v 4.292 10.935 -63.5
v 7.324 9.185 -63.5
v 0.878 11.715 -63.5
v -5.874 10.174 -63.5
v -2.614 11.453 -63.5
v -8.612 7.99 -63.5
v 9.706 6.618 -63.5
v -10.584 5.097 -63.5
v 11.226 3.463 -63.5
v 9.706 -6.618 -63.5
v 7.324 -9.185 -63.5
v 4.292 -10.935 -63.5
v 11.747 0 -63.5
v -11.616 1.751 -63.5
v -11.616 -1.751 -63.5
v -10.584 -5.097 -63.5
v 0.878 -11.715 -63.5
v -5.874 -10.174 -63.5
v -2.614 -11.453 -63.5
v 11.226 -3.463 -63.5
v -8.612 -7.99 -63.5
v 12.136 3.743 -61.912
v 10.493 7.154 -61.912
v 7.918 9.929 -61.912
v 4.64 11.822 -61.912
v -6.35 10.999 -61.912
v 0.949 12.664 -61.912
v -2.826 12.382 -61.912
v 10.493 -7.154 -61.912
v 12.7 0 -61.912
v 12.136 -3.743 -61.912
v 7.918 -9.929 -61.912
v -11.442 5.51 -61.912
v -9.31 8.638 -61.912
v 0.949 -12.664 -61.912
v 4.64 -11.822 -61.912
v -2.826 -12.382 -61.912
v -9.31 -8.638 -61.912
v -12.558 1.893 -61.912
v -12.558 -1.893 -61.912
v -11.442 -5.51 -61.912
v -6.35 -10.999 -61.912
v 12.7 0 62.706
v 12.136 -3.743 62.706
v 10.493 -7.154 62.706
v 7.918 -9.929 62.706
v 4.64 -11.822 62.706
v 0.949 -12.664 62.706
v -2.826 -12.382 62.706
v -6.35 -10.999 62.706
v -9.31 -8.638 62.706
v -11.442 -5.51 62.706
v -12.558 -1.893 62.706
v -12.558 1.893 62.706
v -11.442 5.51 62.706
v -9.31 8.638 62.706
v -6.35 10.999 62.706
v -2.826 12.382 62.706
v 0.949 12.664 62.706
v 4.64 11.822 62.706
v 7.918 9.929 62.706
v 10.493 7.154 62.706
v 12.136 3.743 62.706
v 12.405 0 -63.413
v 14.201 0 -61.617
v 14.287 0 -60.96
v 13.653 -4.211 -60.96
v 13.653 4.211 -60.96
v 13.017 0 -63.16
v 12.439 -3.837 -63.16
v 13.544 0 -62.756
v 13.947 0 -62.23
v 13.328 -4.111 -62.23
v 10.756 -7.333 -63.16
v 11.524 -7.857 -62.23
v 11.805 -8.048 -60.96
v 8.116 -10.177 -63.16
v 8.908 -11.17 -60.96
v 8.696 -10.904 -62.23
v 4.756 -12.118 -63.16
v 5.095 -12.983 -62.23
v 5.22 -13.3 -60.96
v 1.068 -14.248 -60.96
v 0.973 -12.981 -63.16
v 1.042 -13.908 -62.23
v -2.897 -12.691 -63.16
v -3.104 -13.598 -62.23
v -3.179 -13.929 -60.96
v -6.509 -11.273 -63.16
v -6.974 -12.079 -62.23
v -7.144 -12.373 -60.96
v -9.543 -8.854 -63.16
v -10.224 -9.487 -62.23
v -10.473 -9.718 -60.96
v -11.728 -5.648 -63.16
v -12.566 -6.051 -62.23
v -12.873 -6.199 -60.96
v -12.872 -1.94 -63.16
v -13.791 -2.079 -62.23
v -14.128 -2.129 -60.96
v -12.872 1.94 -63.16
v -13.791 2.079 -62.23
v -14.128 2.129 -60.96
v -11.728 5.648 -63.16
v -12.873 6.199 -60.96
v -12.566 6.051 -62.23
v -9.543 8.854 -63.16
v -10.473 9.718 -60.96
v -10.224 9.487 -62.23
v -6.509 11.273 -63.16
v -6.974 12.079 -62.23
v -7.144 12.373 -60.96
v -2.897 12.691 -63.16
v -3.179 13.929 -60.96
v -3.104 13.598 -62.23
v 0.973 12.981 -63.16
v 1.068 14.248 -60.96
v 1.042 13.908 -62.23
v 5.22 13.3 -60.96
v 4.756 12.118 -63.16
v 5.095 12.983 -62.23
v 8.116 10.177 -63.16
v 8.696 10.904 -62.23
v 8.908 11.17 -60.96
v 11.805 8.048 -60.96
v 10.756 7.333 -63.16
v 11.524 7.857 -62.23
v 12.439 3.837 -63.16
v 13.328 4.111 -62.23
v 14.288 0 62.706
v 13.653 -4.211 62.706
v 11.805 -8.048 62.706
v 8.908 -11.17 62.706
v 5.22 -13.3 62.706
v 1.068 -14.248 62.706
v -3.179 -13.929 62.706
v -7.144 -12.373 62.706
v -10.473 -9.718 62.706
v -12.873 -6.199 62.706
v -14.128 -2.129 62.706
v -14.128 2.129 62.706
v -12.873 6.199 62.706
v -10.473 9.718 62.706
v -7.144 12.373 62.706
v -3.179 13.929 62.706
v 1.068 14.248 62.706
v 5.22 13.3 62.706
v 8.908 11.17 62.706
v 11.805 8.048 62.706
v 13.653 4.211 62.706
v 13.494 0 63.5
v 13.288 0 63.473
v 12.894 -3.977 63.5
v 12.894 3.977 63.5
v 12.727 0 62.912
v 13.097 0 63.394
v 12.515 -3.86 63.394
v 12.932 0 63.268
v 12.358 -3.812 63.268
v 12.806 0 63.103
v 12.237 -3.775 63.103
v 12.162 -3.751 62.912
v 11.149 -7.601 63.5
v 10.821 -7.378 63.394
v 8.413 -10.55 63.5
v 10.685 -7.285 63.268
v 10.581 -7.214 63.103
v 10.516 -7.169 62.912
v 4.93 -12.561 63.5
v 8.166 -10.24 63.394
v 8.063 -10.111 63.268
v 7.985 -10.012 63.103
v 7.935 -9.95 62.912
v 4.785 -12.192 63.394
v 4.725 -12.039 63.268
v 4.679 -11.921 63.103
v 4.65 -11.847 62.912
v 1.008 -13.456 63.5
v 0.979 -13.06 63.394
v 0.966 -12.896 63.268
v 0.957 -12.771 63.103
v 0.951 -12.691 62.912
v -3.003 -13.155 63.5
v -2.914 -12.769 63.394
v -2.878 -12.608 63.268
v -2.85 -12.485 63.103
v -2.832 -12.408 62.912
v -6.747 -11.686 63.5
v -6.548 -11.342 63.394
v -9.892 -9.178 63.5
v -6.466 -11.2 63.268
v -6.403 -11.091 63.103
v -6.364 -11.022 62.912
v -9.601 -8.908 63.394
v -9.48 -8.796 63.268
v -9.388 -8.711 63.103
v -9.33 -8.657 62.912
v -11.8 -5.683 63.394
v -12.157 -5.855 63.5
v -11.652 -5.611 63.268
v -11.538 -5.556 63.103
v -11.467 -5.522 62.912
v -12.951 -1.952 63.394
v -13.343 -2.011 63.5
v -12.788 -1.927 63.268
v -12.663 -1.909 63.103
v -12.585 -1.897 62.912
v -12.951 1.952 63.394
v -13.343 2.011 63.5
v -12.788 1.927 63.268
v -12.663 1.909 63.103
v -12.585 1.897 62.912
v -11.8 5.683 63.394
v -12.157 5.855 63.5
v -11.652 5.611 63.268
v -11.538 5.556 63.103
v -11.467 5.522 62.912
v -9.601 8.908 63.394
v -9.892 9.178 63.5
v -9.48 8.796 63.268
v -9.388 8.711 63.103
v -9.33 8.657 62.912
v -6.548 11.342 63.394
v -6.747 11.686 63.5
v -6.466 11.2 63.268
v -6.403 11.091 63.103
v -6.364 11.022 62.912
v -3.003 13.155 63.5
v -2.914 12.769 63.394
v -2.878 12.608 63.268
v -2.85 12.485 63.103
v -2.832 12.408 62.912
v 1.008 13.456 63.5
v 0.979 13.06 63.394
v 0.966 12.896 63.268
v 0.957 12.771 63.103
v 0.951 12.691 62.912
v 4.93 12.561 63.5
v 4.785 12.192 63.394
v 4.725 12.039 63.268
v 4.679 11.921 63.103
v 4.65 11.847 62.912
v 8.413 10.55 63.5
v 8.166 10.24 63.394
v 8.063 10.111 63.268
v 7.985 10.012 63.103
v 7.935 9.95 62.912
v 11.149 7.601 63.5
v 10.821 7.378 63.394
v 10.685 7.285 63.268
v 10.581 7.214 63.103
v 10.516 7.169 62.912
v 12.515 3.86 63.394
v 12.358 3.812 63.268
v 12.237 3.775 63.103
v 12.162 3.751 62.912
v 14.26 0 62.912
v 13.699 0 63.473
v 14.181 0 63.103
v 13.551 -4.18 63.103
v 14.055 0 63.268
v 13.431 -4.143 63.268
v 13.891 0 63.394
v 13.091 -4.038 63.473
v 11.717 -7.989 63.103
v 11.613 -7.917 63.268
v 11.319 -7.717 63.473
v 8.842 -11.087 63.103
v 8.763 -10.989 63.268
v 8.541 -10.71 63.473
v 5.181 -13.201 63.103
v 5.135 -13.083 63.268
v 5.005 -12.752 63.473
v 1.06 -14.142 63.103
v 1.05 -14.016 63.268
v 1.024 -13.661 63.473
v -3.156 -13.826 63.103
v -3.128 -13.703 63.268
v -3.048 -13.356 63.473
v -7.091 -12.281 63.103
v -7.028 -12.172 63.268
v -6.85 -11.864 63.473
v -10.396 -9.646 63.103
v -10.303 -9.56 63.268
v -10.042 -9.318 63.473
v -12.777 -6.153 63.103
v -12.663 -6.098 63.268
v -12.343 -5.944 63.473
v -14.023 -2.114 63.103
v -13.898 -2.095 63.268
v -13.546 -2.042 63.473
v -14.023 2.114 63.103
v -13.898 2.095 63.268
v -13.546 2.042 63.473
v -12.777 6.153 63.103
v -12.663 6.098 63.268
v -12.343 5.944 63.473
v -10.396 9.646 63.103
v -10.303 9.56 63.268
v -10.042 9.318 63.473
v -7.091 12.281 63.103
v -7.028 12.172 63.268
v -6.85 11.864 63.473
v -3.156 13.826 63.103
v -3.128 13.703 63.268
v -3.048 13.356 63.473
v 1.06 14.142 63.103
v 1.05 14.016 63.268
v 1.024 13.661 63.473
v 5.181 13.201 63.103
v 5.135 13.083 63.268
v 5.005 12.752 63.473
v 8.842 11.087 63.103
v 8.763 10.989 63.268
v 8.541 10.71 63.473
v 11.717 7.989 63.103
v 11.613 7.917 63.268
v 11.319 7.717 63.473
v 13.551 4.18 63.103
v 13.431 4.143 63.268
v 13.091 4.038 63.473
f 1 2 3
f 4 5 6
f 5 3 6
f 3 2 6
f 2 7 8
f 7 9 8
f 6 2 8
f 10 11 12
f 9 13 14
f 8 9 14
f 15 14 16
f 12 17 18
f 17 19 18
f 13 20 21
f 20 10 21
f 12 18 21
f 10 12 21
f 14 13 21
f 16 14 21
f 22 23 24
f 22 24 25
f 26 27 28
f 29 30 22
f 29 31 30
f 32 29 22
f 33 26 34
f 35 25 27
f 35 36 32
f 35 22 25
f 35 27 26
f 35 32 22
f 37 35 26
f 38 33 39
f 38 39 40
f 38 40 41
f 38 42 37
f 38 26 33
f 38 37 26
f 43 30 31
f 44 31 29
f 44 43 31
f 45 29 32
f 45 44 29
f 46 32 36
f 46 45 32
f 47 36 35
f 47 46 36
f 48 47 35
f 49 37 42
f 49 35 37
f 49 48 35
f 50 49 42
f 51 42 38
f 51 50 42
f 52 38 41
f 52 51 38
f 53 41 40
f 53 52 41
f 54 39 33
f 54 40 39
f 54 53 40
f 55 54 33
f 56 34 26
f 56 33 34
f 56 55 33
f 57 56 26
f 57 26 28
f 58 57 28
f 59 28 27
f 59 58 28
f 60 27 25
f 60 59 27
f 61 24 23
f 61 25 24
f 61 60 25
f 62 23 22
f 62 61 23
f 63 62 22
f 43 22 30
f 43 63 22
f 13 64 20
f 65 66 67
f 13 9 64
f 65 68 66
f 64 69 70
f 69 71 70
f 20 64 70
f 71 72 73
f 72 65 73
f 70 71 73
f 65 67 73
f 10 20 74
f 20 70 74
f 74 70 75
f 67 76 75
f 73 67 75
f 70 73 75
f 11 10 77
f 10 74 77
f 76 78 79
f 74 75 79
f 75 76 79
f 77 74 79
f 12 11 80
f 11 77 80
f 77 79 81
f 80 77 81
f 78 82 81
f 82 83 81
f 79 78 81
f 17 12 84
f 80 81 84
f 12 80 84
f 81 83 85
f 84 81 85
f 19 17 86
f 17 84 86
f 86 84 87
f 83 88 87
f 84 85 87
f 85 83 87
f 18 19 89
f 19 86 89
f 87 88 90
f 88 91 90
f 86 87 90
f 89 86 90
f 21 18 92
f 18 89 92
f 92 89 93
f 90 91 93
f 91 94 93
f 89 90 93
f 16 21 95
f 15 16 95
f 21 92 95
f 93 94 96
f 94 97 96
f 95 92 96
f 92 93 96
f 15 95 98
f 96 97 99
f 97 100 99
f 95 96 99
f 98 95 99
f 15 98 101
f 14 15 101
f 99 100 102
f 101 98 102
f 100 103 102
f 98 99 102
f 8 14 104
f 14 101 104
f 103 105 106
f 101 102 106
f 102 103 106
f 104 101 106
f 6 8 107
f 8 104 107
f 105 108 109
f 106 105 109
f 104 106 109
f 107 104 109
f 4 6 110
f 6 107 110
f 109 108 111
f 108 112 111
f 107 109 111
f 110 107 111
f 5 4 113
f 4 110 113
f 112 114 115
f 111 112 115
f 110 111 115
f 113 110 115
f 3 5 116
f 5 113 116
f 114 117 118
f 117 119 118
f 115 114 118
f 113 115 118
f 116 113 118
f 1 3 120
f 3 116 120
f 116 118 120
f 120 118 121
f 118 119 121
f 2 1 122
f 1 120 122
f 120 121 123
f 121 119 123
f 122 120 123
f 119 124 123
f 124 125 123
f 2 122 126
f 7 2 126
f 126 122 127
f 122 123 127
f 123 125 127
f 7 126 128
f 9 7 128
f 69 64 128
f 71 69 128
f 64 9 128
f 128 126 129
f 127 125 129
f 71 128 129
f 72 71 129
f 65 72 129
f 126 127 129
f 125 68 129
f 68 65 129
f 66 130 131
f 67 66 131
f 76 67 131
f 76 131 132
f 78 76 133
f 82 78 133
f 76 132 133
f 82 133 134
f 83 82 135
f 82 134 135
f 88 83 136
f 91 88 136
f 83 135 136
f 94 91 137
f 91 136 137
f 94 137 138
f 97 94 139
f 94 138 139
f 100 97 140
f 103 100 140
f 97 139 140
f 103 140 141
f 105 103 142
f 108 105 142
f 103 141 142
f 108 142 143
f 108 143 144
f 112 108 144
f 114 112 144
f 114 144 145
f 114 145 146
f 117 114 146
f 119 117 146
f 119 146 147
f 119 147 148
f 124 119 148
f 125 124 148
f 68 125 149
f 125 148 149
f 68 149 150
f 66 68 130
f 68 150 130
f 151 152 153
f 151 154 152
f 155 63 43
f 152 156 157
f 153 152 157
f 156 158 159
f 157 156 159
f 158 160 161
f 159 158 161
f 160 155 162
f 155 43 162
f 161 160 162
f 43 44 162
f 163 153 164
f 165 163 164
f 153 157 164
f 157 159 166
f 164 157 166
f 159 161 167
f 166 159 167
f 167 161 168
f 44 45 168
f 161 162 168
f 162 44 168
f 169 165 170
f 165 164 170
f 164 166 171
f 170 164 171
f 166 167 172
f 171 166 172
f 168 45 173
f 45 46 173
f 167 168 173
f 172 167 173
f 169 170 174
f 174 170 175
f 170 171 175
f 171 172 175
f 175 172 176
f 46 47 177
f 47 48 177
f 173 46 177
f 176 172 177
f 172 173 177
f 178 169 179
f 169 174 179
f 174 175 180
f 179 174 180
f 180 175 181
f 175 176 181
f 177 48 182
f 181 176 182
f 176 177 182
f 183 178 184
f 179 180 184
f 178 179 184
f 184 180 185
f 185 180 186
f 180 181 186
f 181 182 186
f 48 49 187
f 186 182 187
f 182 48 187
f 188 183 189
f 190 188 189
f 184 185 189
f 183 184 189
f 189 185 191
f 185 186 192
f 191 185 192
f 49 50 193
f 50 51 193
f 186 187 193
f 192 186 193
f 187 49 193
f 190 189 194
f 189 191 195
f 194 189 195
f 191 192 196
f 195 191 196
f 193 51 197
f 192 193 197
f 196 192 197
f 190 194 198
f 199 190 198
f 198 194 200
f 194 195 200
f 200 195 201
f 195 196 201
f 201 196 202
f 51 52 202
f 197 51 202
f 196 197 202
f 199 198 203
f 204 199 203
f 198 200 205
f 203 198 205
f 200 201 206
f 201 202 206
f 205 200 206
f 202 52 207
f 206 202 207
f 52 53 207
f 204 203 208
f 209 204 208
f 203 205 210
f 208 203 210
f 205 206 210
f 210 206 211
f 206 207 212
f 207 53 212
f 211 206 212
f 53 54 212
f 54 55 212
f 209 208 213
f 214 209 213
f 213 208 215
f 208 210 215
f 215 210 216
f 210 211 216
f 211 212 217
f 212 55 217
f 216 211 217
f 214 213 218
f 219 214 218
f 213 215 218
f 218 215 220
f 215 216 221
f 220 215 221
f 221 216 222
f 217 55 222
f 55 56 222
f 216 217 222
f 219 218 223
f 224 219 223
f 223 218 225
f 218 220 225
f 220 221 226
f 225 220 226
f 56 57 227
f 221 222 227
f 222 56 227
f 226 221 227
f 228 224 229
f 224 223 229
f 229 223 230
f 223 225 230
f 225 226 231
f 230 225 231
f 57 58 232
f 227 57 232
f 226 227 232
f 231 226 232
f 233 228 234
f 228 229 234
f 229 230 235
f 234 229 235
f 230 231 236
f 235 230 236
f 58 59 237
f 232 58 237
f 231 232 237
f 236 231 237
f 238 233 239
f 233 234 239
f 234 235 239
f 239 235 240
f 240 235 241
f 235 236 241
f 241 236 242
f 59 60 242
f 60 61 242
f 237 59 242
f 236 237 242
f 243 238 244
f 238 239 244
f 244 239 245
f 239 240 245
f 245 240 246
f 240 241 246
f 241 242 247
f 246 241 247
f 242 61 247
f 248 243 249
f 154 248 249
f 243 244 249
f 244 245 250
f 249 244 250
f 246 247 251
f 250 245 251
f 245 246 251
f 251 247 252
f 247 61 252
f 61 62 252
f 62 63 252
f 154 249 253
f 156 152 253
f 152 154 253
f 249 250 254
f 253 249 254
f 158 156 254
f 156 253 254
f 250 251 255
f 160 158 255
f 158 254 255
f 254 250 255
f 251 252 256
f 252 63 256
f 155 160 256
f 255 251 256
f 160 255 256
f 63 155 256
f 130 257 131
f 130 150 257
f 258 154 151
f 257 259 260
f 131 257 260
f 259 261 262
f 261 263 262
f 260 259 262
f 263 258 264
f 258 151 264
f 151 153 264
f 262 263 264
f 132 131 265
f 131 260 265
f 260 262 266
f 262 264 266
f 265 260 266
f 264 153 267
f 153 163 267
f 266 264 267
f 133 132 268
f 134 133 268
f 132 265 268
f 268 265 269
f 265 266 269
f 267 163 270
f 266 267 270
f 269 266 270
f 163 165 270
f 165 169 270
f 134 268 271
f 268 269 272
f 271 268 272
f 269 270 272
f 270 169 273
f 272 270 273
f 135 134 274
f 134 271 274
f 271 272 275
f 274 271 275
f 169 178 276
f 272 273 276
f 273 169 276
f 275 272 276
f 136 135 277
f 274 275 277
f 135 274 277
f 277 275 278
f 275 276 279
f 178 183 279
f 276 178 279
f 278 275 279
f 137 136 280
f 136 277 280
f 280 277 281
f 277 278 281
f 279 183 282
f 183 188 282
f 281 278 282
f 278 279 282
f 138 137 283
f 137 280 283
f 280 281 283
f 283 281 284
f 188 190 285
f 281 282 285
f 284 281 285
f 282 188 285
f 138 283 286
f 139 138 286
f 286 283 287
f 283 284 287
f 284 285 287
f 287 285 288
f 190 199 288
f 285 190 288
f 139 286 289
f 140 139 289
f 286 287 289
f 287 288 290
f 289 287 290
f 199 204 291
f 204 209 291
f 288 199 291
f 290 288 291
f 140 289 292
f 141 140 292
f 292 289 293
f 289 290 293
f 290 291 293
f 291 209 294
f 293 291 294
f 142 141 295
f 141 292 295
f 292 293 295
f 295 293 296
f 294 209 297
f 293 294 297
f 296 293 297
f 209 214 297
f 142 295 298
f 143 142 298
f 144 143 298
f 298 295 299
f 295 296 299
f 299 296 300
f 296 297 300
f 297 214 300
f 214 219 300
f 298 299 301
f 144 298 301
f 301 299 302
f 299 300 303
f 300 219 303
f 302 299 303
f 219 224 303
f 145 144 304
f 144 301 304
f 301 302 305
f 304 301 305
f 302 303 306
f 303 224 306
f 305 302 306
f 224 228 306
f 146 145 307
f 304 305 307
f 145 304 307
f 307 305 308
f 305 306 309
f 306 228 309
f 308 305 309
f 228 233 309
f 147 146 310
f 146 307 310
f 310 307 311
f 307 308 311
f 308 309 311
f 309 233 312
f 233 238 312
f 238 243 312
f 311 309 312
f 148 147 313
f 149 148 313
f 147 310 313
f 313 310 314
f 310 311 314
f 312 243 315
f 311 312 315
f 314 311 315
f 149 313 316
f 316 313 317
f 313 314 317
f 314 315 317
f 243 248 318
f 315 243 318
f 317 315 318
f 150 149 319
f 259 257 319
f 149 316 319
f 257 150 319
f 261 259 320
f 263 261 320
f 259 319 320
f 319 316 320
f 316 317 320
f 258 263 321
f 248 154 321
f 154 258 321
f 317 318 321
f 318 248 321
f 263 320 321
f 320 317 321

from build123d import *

# Parameters (mm, degrees)
F0_W = 14.2875
F0_H = 127
F2_T = -1.5875
F3_R = 2.54
F4_R = 0.79374


# Not quite as in the source:
# - a fillet or chamfer is up to 0.001 mm smaller than in the source, because OpenCascade refuses the exact size


with BuildPart() as f1:
    # F0 (on Front) → F1 (revolve)
    with BuildSketch(Plane.XZ):
        with Locations((7.14375, 0)):
            Rectangle(F0_W, F0_H)
    revolve(axis=Axis((0, 0, 0), (0, 0, -1)))

    # F2
    f2_openings = [f1.faces().sort_by_distance(p)[0] for p in [
        (0, 0, 63.5),
    ]]
    offset(amount=F2_T, openings=f2_openings)

    # F3
    f3_edges = [f1.edges().sort_by_distance(p)[0] for p in [
        (-14.2875, 0, -63.5),
    ]]
    fillet(f3_edges, radius=F3_R)

    # F4 (radius 0.79375 in the source; OpenCascade refuses exactly that, so slightly less here)
    f4_edges = [f1.edges().sort_by_distance(p)[0] for p in [
        (-14.2875, 0, 63.5),
        (-12.7, 0, 63.5),
    ]]
    fillet(f4_edges, radius=F4_R)


solid = f1.part
